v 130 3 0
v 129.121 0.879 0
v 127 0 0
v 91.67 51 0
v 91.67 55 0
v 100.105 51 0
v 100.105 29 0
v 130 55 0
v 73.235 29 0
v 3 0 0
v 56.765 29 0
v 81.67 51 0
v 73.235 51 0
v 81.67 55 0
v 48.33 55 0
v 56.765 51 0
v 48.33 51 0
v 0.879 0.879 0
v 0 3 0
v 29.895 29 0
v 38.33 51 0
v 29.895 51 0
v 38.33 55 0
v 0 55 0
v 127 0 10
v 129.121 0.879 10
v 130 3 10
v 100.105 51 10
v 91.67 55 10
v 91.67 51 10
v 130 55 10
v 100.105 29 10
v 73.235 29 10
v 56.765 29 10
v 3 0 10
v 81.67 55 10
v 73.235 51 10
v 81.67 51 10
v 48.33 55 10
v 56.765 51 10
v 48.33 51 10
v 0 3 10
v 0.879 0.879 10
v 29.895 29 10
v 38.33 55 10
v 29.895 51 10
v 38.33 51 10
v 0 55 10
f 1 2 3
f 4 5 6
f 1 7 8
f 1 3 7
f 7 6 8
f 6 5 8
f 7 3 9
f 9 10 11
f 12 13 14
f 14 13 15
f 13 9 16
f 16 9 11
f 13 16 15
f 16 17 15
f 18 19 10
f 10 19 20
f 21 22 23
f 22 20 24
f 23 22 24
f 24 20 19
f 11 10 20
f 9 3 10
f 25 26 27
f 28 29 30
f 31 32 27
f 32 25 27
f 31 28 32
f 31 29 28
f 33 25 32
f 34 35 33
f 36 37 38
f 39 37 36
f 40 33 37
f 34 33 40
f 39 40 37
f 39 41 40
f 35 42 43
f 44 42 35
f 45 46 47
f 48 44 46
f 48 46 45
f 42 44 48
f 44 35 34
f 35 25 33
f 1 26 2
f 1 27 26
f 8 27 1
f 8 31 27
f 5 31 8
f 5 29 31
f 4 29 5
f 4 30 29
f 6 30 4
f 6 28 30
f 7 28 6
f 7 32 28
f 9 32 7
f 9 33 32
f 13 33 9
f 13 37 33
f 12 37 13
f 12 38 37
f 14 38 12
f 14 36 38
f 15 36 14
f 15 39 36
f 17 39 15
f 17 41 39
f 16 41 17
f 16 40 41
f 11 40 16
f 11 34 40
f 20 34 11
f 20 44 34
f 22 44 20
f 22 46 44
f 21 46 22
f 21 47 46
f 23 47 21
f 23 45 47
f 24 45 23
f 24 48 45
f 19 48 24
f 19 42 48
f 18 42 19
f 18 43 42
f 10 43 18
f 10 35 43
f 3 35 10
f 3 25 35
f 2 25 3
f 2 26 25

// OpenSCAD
$fn = 32;

// ----------------------------------------------------------------------
// Window plate: 130 x 55 mm, 2 open windows
// ----------------------------------------------------------------------

// --- parameters (mm) ---
profile_height = 10;      // extrusion height
profile_points = 24;      // points of the closed outline

profile = [[0, 3], [0.879, 0.879], [3, 0], [127, 0], [129.121, 0.879], [130, 3], [130, 55], [91.67, 55], [91.67, 51], [100.105, 51], [100.105, 29], [73.235, 29], [73.235, 51], [81.67, 51], [81.67, 55], [48.33, 55], [48.33, 51], [56.765, 51], [56.765, 29], [29.895, 29], [29.895, 51], [38.33, 51], [38.33, 55], [0, 55]];  // single closed polygon, 24 points, counter clockwise

// --- the one profile operation ---
linear_extrude(height = profile_height) polygon(points = profile);
